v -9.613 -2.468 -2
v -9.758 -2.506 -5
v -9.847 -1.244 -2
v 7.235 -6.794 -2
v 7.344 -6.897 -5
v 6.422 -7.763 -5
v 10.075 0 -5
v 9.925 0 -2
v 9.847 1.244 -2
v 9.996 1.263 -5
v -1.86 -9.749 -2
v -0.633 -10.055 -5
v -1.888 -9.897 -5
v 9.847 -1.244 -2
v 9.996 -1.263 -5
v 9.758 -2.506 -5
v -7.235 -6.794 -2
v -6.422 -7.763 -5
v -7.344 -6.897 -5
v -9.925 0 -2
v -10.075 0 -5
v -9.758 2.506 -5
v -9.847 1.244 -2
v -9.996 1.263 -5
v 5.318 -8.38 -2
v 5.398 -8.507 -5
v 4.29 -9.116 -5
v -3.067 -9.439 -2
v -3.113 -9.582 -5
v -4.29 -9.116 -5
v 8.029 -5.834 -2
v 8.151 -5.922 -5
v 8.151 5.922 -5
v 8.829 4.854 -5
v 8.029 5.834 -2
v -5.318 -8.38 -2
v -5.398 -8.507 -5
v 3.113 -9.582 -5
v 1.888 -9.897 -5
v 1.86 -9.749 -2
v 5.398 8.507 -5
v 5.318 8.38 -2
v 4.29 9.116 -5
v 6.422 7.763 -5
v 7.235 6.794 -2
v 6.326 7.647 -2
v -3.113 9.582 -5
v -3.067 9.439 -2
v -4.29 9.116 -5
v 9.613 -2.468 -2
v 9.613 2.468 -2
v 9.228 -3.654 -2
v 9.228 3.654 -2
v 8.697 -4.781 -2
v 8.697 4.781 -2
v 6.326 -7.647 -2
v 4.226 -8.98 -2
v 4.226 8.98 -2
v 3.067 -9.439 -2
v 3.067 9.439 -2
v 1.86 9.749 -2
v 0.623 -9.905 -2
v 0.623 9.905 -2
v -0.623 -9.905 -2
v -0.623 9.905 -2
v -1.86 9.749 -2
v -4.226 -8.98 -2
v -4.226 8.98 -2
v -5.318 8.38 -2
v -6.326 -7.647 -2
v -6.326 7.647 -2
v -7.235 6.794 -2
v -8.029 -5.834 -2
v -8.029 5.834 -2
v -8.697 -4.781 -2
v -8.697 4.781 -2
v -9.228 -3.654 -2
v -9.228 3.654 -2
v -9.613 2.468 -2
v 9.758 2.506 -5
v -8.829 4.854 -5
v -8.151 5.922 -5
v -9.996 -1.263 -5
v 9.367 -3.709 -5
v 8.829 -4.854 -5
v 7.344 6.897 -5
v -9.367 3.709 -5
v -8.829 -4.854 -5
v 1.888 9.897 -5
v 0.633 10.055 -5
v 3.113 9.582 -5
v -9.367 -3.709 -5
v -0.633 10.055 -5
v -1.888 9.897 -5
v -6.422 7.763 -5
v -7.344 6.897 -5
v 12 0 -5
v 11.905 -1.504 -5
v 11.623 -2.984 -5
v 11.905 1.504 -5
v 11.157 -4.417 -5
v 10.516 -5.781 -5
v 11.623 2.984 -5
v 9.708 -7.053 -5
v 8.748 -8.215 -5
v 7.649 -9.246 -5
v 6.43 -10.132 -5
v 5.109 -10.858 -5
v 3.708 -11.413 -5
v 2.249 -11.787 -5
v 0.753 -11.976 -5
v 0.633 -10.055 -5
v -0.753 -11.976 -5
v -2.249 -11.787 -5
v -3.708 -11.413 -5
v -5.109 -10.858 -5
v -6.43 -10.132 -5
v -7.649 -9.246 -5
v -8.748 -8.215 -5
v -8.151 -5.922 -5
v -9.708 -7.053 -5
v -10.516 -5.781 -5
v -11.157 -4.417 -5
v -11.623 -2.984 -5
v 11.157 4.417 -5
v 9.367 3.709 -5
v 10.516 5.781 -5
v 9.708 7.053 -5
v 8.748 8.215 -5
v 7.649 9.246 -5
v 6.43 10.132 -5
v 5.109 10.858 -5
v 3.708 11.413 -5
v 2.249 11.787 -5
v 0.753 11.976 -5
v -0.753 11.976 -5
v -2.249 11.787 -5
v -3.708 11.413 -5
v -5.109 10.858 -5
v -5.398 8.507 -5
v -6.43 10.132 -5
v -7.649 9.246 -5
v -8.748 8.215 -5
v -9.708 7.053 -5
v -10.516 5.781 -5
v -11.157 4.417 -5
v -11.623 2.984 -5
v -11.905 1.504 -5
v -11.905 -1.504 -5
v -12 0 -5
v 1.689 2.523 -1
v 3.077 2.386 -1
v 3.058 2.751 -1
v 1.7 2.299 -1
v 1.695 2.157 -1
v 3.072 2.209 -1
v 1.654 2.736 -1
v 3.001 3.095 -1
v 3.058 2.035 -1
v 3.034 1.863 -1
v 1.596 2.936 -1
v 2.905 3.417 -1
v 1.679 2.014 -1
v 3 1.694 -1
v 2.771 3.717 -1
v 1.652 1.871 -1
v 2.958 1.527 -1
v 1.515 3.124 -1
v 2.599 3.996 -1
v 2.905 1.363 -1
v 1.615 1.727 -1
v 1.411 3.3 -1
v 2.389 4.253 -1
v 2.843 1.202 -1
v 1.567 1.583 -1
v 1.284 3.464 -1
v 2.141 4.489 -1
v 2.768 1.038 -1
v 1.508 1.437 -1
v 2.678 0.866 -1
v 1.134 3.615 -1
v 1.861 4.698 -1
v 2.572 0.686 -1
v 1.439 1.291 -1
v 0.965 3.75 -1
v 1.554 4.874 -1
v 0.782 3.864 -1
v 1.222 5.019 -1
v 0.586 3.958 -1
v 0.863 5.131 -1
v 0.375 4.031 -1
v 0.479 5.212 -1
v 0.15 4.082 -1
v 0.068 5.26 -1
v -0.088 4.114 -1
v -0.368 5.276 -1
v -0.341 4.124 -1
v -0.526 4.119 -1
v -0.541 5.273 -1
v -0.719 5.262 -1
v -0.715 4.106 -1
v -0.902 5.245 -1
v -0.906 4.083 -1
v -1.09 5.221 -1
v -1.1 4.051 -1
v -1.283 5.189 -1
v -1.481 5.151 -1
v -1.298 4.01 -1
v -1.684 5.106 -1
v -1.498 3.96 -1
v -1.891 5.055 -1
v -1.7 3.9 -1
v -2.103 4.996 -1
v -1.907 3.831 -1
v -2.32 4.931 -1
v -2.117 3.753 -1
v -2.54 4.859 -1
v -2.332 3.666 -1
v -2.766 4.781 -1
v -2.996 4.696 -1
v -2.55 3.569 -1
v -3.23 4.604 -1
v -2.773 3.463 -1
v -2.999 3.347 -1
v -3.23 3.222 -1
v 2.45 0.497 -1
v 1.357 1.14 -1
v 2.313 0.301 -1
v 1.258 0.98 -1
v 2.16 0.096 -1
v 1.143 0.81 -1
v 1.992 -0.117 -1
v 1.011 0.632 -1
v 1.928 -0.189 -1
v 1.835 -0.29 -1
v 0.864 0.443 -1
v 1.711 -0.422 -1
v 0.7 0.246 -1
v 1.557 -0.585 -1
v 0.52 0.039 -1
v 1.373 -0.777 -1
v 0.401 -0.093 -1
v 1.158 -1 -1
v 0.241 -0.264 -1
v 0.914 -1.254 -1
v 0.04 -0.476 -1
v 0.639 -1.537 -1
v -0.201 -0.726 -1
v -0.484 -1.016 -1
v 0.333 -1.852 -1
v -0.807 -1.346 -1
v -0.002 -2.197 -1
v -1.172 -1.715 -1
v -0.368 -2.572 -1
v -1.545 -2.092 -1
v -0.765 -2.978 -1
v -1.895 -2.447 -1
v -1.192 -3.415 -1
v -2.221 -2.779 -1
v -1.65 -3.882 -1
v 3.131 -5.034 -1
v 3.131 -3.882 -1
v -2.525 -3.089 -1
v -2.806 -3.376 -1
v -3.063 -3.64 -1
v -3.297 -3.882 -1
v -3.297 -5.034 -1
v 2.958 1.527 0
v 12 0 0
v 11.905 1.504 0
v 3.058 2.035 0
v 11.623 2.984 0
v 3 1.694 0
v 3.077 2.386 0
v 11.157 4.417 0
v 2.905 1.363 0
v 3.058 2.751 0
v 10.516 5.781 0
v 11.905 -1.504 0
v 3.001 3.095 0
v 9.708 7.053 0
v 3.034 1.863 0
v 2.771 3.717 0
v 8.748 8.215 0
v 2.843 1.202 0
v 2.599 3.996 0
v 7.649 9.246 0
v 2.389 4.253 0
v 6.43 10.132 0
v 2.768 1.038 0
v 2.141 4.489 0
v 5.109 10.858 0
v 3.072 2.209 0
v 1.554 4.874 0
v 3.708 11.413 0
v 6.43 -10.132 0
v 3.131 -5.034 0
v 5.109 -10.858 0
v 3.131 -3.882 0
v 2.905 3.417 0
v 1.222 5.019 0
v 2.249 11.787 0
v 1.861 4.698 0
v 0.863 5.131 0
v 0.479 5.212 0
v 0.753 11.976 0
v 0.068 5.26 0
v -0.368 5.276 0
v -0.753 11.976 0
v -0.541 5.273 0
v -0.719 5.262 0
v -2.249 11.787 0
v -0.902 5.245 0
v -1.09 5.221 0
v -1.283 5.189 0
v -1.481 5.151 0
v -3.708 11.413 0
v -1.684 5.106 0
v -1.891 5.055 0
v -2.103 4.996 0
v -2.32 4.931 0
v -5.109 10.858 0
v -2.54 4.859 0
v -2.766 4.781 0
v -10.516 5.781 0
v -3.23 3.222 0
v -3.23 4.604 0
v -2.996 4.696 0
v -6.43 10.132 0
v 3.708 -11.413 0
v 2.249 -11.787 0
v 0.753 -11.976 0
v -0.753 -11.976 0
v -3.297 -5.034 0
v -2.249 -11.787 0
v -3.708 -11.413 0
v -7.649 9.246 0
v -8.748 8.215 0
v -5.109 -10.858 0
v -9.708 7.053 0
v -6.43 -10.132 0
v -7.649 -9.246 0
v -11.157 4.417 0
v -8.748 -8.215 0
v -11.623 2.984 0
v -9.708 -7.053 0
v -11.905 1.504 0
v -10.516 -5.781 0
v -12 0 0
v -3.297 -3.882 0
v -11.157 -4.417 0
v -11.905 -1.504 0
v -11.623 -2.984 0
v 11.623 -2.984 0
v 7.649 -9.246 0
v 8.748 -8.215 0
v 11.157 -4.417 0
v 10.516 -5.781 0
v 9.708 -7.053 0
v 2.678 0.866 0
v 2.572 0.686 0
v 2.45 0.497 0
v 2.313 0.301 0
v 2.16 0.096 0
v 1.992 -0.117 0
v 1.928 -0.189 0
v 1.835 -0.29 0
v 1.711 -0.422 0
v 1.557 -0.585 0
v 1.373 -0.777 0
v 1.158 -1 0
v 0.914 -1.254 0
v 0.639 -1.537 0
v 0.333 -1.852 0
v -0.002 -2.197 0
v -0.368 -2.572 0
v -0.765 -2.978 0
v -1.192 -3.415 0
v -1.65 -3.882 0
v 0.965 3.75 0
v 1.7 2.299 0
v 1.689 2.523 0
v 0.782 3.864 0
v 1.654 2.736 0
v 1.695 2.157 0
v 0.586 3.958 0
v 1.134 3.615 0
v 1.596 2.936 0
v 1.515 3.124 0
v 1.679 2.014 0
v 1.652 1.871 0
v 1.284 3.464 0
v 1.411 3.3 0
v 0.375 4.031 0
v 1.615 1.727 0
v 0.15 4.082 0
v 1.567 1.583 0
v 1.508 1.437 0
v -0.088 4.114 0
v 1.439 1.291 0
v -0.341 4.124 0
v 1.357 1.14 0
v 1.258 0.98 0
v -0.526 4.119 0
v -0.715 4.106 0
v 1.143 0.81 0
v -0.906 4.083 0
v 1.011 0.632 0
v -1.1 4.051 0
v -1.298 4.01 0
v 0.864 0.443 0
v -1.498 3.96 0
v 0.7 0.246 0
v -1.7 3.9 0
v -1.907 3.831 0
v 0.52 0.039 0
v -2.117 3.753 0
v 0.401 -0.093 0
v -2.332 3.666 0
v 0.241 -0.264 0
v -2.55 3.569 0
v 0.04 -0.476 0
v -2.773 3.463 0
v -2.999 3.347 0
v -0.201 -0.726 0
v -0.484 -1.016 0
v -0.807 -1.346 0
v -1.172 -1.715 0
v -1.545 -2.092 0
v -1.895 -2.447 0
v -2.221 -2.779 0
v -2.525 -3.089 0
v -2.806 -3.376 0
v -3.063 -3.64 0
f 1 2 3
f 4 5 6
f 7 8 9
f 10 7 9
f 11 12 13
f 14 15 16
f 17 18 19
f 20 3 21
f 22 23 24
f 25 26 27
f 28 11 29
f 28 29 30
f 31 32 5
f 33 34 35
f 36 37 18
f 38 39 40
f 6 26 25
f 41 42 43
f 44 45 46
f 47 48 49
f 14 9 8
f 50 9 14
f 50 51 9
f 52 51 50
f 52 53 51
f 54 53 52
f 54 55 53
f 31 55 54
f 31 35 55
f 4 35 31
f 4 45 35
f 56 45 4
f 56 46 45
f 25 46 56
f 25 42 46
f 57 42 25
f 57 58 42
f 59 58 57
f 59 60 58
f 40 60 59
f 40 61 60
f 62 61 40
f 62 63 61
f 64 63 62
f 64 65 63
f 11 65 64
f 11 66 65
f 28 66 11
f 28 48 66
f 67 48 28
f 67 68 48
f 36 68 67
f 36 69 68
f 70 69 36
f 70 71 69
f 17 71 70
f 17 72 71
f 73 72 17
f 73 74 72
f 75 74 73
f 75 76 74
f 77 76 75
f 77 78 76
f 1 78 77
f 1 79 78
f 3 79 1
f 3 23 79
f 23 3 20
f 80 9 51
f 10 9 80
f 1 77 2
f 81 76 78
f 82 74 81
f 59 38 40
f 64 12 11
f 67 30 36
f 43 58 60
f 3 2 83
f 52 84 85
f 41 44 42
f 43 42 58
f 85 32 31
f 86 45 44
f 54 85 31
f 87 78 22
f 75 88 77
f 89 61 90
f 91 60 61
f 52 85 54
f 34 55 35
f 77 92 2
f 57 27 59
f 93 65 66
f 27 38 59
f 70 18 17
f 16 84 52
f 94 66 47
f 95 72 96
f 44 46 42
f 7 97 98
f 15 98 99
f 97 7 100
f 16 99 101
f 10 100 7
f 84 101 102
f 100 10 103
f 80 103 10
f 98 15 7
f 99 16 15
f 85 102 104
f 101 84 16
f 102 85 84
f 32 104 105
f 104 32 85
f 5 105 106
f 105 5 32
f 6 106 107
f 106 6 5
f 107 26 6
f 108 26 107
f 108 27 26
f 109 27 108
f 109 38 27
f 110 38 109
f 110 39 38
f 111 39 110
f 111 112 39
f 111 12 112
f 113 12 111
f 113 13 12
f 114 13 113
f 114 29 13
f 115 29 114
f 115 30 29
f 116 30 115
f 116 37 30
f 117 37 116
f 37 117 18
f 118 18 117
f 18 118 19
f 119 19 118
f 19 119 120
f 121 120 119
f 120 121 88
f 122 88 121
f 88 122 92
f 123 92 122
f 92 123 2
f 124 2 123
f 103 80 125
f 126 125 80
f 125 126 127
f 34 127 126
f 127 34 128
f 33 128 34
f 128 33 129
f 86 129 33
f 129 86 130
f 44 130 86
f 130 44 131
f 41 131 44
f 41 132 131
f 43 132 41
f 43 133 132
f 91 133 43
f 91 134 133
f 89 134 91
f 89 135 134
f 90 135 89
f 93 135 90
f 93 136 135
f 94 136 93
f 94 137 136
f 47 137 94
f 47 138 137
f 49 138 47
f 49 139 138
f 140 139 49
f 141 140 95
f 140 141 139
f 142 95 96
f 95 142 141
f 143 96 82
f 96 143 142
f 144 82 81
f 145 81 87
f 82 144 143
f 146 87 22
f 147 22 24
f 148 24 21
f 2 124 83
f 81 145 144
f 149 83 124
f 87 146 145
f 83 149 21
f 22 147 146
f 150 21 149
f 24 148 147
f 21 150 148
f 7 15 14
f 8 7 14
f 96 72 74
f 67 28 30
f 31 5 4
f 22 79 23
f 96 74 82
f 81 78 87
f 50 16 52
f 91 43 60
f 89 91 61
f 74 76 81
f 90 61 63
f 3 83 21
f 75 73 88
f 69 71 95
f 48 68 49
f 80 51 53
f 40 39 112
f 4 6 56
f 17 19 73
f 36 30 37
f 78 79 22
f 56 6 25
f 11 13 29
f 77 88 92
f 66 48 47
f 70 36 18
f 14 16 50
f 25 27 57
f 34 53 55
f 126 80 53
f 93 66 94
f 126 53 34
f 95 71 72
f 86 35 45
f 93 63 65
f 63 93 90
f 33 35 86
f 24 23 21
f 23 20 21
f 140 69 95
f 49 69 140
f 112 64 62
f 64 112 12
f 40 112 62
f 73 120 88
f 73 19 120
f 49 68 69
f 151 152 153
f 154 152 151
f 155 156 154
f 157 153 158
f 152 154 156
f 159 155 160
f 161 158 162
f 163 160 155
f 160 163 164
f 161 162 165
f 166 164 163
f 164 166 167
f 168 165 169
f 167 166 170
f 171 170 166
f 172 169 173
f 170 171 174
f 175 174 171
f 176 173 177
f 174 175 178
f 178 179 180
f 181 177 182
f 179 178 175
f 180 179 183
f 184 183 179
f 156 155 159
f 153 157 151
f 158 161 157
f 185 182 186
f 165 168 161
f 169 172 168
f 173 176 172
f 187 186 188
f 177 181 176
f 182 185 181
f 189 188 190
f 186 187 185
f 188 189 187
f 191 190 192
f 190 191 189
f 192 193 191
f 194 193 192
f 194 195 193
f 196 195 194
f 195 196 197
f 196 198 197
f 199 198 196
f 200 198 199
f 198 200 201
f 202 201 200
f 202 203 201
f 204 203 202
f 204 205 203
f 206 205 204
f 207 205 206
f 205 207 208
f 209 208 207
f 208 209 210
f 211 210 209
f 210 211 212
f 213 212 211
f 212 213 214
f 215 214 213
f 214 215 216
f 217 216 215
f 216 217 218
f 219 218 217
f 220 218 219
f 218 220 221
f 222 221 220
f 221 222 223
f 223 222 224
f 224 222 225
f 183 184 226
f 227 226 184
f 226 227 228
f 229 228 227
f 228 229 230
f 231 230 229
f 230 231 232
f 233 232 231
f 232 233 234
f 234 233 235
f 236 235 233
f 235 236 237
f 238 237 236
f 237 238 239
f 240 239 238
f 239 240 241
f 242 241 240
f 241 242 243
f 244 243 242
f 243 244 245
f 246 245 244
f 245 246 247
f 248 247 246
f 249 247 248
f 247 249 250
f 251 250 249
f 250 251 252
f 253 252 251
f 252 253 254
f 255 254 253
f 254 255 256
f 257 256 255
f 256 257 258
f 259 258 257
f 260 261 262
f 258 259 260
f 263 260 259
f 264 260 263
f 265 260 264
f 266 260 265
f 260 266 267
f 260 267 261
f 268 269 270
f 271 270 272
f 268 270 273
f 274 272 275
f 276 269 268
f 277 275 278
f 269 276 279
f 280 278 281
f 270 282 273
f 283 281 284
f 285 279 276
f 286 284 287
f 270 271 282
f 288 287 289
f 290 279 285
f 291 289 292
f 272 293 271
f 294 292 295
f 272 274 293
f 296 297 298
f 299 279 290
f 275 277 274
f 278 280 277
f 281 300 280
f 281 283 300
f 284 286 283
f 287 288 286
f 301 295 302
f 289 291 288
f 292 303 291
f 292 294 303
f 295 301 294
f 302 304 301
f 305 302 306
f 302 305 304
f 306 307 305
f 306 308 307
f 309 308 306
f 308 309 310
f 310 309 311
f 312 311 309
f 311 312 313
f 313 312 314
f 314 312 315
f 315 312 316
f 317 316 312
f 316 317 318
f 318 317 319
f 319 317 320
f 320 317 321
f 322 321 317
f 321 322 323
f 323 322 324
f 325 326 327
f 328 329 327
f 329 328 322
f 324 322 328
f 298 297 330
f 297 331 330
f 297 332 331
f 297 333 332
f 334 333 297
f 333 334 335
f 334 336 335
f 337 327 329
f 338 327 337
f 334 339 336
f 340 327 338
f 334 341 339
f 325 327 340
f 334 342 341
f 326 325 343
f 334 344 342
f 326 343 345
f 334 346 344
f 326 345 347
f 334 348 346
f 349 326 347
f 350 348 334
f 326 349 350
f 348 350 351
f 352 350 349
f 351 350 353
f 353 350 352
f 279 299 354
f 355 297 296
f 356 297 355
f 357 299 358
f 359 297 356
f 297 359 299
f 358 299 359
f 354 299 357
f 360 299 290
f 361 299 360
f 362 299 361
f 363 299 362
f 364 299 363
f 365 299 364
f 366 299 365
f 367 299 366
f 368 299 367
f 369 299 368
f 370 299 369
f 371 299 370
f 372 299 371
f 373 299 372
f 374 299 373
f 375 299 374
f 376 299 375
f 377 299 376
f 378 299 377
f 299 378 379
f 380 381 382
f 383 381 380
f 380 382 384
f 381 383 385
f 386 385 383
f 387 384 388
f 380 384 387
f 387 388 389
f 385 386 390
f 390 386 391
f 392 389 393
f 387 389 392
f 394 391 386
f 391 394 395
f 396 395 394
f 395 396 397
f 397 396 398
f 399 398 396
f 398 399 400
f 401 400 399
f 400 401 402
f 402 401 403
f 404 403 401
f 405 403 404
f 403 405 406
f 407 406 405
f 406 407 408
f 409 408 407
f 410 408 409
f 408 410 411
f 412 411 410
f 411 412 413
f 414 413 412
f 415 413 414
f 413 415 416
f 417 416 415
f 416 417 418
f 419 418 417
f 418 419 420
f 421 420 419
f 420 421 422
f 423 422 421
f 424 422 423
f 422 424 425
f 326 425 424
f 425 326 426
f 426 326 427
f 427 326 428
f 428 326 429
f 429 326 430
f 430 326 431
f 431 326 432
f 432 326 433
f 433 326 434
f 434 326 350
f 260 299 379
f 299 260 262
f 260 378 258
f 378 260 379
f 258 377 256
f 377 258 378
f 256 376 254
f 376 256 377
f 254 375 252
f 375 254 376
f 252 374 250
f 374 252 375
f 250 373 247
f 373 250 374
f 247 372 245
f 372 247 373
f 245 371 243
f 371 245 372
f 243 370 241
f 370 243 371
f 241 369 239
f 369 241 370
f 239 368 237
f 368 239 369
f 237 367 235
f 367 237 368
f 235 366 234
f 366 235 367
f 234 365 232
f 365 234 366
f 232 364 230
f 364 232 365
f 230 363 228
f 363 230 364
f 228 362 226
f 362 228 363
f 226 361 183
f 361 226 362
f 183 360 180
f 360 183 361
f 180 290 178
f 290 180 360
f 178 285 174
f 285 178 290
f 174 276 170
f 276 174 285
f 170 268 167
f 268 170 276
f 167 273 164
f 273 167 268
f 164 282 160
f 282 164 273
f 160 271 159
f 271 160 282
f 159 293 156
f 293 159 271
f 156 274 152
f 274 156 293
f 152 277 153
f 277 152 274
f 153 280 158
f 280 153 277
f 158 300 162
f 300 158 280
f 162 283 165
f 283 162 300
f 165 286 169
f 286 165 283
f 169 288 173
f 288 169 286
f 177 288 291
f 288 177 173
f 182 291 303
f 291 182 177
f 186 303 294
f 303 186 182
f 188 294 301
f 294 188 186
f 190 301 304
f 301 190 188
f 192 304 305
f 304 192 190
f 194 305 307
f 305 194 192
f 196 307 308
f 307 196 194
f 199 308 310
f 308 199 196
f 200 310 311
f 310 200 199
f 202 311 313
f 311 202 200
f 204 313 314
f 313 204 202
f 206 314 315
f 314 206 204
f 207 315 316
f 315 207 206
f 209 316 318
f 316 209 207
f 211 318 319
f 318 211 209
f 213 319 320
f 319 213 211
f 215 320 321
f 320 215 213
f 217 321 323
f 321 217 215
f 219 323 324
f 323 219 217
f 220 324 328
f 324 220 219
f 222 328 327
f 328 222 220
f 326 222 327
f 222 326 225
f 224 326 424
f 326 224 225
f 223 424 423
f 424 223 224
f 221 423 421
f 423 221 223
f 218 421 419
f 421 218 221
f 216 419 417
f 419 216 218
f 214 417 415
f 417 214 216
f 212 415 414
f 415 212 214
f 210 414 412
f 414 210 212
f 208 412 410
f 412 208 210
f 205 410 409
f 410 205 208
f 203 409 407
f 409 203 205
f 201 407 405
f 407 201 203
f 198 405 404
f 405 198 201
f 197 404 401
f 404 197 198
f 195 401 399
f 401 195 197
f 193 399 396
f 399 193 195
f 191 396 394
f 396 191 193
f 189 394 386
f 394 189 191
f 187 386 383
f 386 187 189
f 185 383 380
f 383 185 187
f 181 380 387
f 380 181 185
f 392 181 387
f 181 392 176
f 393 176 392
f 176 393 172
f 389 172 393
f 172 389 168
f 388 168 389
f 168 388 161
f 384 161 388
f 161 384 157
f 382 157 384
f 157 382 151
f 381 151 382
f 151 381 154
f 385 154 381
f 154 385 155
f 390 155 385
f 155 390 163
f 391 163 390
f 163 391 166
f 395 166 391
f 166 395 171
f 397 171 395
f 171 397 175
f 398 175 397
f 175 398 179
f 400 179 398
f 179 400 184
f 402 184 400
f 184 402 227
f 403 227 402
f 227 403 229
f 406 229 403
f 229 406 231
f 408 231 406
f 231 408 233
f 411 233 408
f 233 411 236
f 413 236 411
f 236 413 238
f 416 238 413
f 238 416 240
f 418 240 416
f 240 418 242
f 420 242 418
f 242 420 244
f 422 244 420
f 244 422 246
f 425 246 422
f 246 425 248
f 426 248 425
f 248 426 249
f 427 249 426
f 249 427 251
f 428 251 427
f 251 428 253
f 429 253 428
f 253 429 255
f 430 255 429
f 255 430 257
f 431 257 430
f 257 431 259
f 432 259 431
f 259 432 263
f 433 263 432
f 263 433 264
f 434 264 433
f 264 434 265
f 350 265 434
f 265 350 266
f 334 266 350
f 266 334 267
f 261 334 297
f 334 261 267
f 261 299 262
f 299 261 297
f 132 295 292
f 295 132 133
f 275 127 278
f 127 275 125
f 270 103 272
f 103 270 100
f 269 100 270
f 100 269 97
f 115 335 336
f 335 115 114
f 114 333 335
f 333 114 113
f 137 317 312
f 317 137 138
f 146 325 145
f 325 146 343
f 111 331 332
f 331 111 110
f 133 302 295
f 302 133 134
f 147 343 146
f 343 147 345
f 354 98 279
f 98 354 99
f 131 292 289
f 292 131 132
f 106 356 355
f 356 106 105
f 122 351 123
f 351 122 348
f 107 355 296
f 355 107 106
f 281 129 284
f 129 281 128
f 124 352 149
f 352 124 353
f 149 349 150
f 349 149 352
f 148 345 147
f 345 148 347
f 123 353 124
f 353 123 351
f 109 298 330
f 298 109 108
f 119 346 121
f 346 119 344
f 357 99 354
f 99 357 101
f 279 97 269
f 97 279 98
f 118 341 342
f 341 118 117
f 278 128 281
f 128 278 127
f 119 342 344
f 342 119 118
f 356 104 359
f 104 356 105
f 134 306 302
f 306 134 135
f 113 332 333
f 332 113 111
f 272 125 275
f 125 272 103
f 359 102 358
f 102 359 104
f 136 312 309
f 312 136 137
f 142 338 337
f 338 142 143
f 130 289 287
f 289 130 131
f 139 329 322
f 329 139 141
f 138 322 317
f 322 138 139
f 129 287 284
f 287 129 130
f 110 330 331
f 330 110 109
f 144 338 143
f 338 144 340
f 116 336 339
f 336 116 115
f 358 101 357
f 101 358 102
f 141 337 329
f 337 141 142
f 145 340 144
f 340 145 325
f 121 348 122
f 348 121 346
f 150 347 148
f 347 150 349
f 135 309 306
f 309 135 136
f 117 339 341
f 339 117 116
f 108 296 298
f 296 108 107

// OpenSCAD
$fn = 50;

difference() {
	union() {
		translate(v = [0, 0, -5.0]) {
			cylinder(h = 5, r = 12.0);
		}
	}
	union() {
		#translate(v = [0, 0, -5.0]) {
			cylinder(h = 3, r1 = 10.075, r2 = 9.925);
		}
		translate(v = [0, 0, -1]) {
			linear_extrude(height = 1) {
				text(font = "Impact", halign = "center", size = 10, text = "2", valign = "center");
			}
		}
	}
}
